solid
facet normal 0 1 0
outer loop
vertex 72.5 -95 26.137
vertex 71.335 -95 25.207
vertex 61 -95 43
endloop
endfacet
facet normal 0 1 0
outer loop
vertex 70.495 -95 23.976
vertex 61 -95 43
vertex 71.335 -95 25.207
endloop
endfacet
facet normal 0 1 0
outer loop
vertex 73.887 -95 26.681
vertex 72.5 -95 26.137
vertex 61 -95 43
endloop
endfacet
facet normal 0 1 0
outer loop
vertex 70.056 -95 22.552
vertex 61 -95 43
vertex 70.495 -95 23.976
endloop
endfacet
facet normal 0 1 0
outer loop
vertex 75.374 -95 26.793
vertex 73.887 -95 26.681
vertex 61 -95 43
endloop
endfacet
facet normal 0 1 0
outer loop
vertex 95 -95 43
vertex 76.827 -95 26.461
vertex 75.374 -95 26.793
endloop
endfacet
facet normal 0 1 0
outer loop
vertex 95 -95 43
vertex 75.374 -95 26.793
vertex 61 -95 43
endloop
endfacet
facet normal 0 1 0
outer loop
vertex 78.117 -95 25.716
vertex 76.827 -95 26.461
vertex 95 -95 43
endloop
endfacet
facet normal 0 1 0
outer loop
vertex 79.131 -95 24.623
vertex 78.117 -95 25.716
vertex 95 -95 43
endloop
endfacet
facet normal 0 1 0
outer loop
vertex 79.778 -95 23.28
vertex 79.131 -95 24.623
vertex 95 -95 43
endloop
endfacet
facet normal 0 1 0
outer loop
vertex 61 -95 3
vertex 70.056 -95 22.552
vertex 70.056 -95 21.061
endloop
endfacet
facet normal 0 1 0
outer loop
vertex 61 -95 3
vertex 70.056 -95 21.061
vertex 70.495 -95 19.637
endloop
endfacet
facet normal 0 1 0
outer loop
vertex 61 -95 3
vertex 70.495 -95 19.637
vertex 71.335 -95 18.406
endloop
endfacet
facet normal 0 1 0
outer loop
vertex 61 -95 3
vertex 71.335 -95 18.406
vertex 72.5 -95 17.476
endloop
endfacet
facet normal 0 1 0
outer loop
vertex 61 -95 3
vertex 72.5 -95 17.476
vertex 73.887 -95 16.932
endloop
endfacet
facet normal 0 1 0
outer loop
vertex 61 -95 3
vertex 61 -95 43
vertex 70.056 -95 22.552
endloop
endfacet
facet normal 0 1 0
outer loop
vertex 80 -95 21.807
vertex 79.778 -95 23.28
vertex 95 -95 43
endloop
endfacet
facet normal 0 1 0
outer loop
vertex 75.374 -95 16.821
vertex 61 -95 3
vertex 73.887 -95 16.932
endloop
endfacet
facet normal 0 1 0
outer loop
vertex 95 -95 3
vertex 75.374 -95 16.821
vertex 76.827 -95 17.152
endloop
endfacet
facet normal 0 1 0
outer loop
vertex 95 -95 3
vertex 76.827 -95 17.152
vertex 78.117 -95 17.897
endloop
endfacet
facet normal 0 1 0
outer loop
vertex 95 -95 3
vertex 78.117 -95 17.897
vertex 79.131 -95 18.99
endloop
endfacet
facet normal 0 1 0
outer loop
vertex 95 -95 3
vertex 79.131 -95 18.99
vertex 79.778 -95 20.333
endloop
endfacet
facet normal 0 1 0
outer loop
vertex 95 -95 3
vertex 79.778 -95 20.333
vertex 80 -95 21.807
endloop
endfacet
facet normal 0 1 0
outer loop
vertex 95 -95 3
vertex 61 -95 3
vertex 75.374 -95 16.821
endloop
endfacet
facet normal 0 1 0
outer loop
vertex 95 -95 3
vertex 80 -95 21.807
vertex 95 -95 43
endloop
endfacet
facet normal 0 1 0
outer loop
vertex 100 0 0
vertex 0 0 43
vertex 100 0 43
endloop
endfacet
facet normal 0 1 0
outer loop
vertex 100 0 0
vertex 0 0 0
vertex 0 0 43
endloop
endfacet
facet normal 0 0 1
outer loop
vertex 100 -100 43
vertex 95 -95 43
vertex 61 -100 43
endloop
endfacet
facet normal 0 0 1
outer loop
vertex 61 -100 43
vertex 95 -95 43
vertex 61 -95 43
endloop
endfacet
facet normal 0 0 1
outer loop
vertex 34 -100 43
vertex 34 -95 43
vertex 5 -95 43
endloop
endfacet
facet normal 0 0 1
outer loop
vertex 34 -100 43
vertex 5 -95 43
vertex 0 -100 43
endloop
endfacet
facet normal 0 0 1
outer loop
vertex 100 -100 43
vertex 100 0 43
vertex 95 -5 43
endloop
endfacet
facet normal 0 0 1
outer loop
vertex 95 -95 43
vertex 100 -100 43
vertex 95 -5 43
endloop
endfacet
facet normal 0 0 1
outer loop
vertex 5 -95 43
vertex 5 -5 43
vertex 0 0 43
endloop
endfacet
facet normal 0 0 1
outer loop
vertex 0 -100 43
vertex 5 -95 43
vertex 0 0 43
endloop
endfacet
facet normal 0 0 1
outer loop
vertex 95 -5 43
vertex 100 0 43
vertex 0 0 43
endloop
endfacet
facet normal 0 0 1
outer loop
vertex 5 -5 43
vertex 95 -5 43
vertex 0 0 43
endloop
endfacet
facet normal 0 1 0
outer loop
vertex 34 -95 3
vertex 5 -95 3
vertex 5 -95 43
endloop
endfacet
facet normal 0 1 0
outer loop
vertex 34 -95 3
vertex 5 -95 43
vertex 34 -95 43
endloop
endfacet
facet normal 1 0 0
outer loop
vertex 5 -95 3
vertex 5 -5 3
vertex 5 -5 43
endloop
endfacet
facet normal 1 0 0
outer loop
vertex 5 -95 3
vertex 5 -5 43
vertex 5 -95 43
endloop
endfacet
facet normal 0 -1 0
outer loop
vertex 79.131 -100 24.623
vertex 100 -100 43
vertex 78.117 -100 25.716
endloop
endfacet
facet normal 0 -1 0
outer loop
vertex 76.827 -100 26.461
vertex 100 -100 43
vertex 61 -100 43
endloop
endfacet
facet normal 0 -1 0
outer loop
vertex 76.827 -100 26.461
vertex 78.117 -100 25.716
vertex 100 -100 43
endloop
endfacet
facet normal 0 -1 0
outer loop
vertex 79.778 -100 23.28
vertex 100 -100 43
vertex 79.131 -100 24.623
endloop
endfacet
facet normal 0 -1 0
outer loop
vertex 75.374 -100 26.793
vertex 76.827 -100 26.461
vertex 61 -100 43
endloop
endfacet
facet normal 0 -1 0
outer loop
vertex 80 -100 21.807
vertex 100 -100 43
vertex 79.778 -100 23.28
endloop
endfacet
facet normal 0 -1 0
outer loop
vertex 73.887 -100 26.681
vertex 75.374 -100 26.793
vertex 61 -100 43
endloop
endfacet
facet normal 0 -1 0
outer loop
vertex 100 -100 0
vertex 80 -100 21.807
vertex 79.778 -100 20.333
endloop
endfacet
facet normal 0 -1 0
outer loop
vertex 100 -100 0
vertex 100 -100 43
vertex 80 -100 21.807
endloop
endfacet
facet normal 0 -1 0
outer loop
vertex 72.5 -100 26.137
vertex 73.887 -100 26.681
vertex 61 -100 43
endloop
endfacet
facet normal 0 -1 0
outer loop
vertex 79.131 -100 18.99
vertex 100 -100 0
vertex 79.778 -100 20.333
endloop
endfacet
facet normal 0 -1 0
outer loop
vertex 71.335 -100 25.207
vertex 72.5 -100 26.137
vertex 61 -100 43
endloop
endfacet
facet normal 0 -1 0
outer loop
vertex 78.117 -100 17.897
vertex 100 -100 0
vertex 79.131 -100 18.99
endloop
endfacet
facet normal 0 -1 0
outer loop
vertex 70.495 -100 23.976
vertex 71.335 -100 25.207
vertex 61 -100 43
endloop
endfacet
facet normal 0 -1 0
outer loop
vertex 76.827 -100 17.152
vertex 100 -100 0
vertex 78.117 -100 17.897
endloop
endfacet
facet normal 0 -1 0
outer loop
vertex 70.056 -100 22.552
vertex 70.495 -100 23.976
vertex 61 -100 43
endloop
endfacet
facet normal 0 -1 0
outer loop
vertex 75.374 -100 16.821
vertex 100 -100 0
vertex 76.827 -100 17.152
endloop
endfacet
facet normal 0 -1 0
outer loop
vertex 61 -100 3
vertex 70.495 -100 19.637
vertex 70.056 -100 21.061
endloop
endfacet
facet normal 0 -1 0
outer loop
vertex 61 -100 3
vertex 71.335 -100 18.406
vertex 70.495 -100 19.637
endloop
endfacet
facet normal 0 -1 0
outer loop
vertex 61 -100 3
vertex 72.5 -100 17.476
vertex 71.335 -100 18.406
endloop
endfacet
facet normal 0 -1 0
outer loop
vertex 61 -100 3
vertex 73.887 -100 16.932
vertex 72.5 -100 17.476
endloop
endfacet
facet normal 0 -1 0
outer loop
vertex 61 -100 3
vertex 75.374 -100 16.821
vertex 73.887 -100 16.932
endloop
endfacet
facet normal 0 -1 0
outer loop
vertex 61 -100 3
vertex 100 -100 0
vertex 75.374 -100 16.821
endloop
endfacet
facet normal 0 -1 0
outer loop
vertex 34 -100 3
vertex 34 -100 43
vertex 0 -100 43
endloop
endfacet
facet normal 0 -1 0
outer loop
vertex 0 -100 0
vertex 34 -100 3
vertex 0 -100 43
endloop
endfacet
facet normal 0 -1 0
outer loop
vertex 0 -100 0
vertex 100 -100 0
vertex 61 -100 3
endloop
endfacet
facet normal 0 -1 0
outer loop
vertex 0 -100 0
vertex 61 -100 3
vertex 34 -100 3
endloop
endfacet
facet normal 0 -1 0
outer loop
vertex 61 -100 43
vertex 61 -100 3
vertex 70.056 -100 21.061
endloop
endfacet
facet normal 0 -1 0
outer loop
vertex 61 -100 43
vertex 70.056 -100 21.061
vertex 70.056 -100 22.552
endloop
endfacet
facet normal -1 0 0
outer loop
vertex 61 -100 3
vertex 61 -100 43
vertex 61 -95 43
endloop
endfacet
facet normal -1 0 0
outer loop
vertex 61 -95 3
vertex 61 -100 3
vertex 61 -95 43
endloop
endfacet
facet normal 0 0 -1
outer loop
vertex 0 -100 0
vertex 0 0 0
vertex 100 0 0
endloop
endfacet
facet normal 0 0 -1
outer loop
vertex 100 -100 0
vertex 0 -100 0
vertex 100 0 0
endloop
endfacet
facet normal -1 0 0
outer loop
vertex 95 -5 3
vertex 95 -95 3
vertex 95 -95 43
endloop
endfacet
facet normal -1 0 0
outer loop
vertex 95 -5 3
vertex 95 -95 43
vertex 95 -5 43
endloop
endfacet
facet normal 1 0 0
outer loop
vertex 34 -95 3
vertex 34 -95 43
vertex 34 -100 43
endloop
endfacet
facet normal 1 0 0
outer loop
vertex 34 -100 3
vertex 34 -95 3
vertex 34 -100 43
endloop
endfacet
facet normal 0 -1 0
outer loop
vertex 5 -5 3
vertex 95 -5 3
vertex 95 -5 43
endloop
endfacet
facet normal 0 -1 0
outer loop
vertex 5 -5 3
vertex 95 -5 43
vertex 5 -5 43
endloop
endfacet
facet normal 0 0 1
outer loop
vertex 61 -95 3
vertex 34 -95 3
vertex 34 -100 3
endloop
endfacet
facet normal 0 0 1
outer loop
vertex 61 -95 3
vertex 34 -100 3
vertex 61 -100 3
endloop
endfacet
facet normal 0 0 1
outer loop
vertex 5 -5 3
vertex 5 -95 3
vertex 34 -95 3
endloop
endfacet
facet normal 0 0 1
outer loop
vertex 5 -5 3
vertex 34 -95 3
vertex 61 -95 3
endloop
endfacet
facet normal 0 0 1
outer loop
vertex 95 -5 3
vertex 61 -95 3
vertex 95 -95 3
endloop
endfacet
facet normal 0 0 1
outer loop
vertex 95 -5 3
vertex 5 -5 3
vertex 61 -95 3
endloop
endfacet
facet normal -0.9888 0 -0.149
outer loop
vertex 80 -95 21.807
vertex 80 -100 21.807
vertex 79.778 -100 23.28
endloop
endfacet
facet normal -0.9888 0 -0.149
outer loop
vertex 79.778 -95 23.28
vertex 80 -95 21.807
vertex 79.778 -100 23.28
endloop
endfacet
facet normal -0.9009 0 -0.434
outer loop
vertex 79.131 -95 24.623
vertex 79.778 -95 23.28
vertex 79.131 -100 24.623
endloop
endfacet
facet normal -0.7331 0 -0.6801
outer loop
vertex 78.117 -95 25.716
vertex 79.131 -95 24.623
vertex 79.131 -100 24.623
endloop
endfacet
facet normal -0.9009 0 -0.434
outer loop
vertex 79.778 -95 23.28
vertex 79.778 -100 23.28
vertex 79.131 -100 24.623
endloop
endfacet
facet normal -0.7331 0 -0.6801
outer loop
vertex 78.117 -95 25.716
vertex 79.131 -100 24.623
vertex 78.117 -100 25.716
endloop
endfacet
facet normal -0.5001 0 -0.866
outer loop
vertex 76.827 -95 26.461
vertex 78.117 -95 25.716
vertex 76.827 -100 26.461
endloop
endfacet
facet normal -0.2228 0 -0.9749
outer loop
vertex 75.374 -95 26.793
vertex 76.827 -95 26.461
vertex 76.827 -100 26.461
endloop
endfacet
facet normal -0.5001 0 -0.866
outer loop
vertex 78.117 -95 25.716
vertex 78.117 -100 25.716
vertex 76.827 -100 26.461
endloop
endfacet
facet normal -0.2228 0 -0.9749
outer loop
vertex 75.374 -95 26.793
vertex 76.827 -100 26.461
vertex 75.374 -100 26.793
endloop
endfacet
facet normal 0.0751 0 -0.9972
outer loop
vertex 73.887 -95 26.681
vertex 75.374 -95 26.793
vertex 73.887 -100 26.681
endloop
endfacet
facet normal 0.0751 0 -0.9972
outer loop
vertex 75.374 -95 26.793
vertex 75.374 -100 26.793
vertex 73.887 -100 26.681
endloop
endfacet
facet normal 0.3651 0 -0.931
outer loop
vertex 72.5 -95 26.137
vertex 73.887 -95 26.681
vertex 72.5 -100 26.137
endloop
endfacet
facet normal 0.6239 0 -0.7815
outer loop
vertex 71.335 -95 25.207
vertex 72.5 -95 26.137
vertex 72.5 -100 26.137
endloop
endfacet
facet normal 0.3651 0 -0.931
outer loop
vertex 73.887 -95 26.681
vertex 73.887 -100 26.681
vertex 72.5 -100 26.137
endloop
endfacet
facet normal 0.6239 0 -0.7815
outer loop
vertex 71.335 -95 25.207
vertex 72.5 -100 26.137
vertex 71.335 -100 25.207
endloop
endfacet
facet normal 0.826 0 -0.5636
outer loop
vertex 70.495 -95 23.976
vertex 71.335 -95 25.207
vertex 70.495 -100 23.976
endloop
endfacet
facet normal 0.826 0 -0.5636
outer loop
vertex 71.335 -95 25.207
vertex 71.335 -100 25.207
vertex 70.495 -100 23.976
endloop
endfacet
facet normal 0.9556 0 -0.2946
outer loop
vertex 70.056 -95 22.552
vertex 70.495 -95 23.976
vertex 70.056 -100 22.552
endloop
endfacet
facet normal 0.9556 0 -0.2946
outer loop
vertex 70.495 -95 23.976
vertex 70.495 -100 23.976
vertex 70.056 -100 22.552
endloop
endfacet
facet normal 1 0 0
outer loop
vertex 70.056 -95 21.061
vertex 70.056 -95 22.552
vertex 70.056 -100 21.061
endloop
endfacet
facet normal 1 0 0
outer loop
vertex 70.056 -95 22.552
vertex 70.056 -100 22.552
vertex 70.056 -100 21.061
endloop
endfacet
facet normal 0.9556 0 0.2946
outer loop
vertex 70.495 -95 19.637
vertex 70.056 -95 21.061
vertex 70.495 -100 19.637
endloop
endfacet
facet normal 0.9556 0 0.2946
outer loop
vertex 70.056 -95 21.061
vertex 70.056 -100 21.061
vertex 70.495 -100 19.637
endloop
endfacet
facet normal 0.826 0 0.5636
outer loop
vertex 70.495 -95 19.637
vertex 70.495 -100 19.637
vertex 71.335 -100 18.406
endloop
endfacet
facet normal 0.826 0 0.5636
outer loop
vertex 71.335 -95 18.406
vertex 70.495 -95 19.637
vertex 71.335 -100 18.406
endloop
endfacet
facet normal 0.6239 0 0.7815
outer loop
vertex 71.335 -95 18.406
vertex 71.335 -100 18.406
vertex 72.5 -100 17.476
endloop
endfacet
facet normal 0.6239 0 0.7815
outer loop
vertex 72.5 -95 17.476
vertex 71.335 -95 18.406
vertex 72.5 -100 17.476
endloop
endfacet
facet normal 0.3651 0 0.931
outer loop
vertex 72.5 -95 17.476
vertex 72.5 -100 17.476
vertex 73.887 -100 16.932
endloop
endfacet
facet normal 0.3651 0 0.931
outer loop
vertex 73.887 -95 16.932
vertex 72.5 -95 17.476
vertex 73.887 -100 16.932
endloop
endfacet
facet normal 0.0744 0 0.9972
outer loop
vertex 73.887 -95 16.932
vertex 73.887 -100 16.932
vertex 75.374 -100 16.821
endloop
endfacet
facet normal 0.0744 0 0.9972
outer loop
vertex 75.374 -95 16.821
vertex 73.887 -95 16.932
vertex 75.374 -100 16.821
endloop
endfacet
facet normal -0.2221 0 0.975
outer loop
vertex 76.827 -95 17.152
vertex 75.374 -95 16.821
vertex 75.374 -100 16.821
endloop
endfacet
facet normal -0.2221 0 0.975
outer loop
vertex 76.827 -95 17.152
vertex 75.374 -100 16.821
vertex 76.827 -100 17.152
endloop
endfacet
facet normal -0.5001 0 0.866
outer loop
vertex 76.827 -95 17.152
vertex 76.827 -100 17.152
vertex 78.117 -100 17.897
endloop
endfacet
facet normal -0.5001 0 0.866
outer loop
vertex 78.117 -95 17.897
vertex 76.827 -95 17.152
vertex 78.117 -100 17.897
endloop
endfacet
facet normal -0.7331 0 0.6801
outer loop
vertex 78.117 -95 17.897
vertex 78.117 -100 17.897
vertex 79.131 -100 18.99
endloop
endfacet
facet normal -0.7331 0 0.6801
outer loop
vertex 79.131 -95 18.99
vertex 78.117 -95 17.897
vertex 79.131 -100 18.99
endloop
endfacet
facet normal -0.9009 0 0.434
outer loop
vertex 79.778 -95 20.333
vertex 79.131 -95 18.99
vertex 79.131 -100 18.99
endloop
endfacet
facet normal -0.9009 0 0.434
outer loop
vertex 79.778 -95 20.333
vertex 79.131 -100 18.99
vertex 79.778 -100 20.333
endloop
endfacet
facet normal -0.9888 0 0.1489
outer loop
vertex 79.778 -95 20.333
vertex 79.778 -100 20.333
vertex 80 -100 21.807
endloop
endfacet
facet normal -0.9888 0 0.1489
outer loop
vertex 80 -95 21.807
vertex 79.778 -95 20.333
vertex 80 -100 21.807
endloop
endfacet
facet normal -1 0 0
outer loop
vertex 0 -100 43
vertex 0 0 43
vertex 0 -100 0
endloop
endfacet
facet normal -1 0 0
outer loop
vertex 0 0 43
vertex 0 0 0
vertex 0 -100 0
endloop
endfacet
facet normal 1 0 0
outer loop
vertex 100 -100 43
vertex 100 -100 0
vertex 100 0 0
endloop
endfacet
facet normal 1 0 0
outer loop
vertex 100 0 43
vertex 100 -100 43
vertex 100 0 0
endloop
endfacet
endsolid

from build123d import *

# Parameters (mm, degrees)
SKETCH1_W           = 100
SKETCH1_H           = 100
BOSS_EXTRUDE1_DEPTH = 3
BOSS_EXTRUDE2_DEPTH = 40
SKETCH3_R           = 5
CUT_EXTRUDE1_DEPTH  = 40


with BuildPart() as part:
    # Sketch1 → Boss-Extrude1 (new body)
    with BuildSketch(Plane.XY):
        with Locations((50, -50)):
            Rectangle(SKETCH1_W, SKETCH1_H)
    extrude(amount=BOSS_EXTRUDE1_DEPTH)

    # Sketch2 → Boss-Extrude2 (add)
    with BuildSketch(Plane.XY.offset(3)):
        Polygon((0, 0), (100, 0), (100, -5), (100, -100), (61, -100), (61, -95), (95, -95), (95, -5), (5, -5), (5, -95), (34, -95), (34, -100), (0, -100), (0, -6.075944417), align=None)
    extrude(amount=BOSS_EXTRUDE2_DEPTH)

    # Sketch3 → Cut-Extrude1 (cut)
    with BuildSketch(Plane.XZ.offset(100)):
        with Locations((75, 21.806521963)):
            Circle(SKETCH3_R)
    extrude(amount=-CUT_EXTRUDE1_DEPTH, mode=Mode.SUBTRACT)


solid = part.part
